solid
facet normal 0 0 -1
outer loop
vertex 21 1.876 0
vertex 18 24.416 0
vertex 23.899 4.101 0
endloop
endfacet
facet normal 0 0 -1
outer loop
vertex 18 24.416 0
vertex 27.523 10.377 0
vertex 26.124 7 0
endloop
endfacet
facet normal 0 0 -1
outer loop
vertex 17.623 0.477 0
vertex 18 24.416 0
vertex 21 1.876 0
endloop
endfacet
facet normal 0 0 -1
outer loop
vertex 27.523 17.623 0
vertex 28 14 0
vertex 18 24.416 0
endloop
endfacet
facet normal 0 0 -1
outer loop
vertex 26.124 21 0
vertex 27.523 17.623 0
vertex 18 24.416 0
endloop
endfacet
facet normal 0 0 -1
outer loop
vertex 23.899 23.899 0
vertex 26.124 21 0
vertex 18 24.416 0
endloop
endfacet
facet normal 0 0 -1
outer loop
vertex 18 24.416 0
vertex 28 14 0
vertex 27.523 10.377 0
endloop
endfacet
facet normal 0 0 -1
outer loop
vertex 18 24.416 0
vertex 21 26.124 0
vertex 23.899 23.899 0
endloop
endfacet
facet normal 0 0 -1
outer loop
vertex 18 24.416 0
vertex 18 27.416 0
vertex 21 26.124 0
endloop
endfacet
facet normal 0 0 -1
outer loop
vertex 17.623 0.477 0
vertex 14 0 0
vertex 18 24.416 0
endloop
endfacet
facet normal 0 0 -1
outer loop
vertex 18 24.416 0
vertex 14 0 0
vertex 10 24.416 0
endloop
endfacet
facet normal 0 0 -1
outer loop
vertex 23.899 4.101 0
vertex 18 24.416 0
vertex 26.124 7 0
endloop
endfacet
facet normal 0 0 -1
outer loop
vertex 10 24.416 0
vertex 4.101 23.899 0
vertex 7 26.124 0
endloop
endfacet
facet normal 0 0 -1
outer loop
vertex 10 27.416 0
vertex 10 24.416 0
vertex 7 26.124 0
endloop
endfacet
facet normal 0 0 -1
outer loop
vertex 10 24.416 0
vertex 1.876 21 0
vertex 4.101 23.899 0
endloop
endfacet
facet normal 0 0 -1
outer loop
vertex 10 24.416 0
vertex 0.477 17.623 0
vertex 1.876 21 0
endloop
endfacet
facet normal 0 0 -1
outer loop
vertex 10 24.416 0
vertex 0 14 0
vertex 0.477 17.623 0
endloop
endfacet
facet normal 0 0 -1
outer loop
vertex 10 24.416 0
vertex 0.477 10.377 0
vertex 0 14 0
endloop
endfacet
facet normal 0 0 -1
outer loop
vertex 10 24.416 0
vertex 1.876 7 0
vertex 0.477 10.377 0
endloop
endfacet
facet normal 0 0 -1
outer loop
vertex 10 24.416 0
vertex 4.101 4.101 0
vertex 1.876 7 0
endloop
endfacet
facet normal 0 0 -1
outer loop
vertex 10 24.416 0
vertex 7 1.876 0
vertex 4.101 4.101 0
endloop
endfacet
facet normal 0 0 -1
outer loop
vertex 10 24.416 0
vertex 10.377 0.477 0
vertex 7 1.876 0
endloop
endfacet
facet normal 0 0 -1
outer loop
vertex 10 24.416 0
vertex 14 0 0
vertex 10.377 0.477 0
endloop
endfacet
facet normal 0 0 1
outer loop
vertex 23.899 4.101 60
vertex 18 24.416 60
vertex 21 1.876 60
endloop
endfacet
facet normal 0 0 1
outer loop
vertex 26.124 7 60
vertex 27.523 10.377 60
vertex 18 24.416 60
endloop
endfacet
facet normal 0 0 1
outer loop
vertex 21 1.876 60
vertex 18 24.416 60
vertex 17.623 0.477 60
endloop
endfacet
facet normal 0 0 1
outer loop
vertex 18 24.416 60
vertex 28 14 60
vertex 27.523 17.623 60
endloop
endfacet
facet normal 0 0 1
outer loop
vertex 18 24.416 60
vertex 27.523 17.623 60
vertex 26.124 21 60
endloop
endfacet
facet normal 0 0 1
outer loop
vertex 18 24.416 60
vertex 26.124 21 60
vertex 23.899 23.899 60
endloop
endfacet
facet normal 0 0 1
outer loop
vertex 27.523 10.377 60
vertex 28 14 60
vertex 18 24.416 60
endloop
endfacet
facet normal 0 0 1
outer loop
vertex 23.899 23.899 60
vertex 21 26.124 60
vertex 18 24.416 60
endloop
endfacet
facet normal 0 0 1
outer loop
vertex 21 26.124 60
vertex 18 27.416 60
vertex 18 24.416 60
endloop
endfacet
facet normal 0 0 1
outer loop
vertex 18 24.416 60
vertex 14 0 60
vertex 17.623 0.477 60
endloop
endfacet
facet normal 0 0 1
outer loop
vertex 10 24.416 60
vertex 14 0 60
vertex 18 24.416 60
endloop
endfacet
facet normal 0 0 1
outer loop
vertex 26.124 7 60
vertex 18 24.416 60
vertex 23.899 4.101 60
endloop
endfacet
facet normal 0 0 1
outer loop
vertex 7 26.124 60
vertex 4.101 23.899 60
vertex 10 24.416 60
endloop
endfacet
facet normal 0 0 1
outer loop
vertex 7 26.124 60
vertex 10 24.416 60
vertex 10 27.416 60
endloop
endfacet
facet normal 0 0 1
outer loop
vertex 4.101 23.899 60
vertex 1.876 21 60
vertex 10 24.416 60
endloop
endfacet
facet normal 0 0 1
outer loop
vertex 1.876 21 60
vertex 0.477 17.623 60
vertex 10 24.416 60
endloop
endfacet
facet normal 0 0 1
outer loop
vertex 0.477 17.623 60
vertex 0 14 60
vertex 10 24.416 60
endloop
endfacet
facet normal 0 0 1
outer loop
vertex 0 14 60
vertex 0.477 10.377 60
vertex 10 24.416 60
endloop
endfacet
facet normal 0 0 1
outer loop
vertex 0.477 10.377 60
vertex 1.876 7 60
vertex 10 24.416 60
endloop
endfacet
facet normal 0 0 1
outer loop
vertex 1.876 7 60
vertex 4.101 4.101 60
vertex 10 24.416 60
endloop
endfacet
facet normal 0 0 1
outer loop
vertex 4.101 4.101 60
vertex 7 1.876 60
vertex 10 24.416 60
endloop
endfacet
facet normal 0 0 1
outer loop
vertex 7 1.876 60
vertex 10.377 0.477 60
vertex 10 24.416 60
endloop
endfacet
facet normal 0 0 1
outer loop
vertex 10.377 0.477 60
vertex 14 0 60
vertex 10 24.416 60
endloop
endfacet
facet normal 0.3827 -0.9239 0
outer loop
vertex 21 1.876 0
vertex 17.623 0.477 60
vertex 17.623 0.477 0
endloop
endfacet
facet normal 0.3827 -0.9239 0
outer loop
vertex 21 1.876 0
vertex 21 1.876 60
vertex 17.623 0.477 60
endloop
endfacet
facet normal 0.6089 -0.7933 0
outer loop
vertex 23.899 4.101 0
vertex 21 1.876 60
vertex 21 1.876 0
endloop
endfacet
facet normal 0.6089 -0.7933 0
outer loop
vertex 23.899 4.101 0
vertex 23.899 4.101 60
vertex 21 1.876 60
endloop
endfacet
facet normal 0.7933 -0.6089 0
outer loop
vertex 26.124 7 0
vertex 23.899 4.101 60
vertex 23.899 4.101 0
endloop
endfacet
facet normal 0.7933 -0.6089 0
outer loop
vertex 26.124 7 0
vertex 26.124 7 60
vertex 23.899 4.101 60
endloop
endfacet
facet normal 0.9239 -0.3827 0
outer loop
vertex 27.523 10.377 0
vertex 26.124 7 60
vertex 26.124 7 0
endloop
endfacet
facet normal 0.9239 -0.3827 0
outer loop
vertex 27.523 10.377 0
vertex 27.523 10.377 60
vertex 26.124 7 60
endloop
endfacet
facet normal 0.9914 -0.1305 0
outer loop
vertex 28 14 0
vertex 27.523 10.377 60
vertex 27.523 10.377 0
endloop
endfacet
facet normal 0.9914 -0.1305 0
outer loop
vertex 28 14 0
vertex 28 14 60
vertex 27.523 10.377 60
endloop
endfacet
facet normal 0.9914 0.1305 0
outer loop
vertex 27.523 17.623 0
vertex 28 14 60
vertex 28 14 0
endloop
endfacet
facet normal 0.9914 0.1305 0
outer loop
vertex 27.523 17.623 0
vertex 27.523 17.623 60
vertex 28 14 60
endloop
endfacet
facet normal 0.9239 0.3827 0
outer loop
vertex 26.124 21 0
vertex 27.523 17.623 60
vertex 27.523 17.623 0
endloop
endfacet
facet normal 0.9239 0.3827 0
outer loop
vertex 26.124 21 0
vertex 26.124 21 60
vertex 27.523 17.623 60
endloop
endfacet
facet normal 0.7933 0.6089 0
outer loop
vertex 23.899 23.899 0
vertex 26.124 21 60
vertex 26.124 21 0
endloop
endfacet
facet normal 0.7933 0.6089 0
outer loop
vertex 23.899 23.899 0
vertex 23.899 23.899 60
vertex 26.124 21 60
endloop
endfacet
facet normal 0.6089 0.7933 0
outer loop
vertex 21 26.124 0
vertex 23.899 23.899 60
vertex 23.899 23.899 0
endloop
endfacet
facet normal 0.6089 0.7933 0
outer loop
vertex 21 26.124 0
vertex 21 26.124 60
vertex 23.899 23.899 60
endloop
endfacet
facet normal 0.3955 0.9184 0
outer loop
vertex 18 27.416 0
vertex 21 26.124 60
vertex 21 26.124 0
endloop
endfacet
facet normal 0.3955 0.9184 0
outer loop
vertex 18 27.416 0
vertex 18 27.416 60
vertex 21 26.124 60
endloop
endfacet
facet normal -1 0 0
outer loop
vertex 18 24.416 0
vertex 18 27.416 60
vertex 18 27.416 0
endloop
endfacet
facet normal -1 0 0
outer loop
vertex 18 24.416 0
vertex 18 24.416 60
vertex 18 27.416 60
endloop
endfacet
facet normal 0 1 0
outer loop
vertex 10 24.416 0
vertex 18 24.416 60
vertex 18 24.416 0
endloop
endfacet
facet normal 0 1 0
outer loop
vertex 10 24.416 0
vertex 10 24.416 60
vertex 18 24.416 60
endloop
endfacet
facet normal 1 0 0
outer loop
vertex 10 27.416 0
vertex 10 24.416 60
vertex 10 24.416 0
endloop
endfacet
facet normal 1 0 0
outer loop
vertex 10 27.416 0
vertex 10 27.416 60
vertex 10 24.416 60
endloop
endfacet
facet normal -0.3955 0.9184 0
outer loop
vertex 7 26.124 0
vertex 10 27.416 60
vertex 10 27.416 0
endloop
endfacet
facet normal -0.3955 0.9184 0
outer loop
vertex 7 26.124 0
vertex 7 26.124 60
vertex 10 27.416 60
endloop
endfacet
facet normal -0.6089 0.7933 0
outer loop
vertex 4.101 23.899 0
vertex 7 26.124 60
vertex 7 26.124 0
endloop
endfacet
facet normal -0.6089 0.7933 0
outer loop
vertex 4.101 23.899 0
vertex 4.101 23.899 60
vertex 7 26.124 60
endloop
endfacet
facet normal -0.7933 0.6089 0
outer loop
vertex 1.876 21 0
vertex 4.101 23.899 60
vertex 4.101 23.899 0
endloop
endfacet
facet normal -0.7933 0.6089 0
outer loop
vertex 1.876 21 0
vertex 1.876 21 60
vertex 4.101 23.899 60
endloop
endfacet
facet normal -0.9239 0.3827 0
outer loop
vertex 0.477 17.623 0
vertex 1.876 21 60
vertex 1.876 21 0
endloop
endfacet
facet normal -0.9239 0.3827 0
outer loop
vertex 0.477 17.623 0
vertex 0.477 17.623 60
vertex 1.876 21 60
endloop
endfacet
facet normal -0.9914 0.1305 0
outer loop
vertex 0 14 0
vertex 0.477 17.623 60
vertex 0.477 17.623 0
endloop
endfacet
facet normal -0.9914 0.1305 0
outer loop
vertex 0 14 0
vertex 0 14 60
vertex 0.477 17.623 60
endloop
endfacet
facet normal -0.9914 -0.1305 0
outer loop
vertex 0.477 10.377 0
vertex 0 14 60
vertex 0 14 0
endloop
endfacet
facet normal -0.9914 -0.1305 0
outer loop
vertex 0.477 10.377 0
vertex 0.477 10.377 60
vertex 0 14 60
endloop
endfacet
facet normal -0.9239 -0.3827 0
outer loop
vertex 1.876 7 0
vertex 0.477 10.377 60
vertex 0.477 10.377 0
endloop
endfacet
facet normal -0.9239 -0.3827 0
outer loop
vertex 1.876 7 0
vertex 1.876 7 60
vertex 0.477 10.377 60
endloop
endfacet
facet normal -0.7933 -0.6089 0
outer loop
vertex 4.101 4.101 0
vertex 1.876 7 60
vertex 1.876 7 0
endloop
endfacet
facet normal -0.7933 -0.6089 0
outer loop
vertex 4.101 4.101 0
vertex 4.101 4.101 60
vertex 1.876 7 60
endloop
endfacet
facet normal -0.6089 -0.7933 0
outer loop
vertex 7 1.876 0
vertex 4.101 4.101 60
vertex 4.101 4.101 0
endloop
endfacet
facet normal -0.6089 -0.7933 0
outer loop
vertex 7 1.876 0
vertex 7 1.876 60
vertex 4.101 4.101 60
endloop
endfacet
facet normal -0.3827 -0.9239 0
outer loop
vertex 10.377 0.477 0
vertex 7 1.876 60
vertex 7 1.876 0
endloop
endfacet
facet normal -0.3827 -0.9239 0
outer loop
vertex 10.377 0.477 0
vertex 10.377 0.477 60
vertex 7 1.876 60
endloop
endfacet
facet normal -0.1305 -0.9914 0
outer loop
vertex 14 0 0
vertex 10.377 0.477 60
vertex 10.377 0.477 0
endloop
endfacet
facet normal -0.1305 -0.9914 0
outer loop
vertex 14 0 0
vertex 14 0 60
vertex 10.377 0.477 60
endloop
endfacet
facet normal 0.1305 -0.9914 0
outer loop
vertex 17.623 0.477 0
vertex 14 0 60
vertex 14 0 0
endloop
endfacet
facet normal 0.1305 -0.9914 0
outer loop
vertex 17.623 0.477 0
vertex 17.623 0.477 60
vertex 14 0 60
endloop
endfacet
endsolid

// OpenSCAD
$fn = 32;

// ----------------------------------------------------------------------
// Keyway shaft: d28 shaft, key 8 x 3 mm
// ----------------------------------------------------------------------

// --- parameters (mm) ---
shaft_r = 14;             // shaft radius
key_w = 8;                // keyway width
key_d = 3;                // keyway depth below the surface line
plate_t = 60;             // shaft length, Z (extrusion height)

shaft_d = 2 * shaft_r;  // shaft diameter
circle_step = 15;  // polygon sampling step, degrees

profile = [[7, 26.124], [4.101, 23.899], [1.876, 21], [0.477, 17.623], [0, 14], [0.477, 10.377], [1.876, 7], [4.101, 4.101], [7, 1.876], [10.377, 0.477], [14, 0], [17.623, 0.477], [21, 1.876], [23.899, 4.101], [26.124, 7], [27.523, 10.377], [28, 14], [27.523, 17.623], [26.124, 21], [23.899, 23.899], [21, 26.124], [18, 27.416], [18, 24.416], [10, 24.416], [10, 27.416]];  // primary outline, 25 points, counter clockwise

// --- the one profile operation ---
linear_extrude(height = plate_t) polygon(points = profile);
